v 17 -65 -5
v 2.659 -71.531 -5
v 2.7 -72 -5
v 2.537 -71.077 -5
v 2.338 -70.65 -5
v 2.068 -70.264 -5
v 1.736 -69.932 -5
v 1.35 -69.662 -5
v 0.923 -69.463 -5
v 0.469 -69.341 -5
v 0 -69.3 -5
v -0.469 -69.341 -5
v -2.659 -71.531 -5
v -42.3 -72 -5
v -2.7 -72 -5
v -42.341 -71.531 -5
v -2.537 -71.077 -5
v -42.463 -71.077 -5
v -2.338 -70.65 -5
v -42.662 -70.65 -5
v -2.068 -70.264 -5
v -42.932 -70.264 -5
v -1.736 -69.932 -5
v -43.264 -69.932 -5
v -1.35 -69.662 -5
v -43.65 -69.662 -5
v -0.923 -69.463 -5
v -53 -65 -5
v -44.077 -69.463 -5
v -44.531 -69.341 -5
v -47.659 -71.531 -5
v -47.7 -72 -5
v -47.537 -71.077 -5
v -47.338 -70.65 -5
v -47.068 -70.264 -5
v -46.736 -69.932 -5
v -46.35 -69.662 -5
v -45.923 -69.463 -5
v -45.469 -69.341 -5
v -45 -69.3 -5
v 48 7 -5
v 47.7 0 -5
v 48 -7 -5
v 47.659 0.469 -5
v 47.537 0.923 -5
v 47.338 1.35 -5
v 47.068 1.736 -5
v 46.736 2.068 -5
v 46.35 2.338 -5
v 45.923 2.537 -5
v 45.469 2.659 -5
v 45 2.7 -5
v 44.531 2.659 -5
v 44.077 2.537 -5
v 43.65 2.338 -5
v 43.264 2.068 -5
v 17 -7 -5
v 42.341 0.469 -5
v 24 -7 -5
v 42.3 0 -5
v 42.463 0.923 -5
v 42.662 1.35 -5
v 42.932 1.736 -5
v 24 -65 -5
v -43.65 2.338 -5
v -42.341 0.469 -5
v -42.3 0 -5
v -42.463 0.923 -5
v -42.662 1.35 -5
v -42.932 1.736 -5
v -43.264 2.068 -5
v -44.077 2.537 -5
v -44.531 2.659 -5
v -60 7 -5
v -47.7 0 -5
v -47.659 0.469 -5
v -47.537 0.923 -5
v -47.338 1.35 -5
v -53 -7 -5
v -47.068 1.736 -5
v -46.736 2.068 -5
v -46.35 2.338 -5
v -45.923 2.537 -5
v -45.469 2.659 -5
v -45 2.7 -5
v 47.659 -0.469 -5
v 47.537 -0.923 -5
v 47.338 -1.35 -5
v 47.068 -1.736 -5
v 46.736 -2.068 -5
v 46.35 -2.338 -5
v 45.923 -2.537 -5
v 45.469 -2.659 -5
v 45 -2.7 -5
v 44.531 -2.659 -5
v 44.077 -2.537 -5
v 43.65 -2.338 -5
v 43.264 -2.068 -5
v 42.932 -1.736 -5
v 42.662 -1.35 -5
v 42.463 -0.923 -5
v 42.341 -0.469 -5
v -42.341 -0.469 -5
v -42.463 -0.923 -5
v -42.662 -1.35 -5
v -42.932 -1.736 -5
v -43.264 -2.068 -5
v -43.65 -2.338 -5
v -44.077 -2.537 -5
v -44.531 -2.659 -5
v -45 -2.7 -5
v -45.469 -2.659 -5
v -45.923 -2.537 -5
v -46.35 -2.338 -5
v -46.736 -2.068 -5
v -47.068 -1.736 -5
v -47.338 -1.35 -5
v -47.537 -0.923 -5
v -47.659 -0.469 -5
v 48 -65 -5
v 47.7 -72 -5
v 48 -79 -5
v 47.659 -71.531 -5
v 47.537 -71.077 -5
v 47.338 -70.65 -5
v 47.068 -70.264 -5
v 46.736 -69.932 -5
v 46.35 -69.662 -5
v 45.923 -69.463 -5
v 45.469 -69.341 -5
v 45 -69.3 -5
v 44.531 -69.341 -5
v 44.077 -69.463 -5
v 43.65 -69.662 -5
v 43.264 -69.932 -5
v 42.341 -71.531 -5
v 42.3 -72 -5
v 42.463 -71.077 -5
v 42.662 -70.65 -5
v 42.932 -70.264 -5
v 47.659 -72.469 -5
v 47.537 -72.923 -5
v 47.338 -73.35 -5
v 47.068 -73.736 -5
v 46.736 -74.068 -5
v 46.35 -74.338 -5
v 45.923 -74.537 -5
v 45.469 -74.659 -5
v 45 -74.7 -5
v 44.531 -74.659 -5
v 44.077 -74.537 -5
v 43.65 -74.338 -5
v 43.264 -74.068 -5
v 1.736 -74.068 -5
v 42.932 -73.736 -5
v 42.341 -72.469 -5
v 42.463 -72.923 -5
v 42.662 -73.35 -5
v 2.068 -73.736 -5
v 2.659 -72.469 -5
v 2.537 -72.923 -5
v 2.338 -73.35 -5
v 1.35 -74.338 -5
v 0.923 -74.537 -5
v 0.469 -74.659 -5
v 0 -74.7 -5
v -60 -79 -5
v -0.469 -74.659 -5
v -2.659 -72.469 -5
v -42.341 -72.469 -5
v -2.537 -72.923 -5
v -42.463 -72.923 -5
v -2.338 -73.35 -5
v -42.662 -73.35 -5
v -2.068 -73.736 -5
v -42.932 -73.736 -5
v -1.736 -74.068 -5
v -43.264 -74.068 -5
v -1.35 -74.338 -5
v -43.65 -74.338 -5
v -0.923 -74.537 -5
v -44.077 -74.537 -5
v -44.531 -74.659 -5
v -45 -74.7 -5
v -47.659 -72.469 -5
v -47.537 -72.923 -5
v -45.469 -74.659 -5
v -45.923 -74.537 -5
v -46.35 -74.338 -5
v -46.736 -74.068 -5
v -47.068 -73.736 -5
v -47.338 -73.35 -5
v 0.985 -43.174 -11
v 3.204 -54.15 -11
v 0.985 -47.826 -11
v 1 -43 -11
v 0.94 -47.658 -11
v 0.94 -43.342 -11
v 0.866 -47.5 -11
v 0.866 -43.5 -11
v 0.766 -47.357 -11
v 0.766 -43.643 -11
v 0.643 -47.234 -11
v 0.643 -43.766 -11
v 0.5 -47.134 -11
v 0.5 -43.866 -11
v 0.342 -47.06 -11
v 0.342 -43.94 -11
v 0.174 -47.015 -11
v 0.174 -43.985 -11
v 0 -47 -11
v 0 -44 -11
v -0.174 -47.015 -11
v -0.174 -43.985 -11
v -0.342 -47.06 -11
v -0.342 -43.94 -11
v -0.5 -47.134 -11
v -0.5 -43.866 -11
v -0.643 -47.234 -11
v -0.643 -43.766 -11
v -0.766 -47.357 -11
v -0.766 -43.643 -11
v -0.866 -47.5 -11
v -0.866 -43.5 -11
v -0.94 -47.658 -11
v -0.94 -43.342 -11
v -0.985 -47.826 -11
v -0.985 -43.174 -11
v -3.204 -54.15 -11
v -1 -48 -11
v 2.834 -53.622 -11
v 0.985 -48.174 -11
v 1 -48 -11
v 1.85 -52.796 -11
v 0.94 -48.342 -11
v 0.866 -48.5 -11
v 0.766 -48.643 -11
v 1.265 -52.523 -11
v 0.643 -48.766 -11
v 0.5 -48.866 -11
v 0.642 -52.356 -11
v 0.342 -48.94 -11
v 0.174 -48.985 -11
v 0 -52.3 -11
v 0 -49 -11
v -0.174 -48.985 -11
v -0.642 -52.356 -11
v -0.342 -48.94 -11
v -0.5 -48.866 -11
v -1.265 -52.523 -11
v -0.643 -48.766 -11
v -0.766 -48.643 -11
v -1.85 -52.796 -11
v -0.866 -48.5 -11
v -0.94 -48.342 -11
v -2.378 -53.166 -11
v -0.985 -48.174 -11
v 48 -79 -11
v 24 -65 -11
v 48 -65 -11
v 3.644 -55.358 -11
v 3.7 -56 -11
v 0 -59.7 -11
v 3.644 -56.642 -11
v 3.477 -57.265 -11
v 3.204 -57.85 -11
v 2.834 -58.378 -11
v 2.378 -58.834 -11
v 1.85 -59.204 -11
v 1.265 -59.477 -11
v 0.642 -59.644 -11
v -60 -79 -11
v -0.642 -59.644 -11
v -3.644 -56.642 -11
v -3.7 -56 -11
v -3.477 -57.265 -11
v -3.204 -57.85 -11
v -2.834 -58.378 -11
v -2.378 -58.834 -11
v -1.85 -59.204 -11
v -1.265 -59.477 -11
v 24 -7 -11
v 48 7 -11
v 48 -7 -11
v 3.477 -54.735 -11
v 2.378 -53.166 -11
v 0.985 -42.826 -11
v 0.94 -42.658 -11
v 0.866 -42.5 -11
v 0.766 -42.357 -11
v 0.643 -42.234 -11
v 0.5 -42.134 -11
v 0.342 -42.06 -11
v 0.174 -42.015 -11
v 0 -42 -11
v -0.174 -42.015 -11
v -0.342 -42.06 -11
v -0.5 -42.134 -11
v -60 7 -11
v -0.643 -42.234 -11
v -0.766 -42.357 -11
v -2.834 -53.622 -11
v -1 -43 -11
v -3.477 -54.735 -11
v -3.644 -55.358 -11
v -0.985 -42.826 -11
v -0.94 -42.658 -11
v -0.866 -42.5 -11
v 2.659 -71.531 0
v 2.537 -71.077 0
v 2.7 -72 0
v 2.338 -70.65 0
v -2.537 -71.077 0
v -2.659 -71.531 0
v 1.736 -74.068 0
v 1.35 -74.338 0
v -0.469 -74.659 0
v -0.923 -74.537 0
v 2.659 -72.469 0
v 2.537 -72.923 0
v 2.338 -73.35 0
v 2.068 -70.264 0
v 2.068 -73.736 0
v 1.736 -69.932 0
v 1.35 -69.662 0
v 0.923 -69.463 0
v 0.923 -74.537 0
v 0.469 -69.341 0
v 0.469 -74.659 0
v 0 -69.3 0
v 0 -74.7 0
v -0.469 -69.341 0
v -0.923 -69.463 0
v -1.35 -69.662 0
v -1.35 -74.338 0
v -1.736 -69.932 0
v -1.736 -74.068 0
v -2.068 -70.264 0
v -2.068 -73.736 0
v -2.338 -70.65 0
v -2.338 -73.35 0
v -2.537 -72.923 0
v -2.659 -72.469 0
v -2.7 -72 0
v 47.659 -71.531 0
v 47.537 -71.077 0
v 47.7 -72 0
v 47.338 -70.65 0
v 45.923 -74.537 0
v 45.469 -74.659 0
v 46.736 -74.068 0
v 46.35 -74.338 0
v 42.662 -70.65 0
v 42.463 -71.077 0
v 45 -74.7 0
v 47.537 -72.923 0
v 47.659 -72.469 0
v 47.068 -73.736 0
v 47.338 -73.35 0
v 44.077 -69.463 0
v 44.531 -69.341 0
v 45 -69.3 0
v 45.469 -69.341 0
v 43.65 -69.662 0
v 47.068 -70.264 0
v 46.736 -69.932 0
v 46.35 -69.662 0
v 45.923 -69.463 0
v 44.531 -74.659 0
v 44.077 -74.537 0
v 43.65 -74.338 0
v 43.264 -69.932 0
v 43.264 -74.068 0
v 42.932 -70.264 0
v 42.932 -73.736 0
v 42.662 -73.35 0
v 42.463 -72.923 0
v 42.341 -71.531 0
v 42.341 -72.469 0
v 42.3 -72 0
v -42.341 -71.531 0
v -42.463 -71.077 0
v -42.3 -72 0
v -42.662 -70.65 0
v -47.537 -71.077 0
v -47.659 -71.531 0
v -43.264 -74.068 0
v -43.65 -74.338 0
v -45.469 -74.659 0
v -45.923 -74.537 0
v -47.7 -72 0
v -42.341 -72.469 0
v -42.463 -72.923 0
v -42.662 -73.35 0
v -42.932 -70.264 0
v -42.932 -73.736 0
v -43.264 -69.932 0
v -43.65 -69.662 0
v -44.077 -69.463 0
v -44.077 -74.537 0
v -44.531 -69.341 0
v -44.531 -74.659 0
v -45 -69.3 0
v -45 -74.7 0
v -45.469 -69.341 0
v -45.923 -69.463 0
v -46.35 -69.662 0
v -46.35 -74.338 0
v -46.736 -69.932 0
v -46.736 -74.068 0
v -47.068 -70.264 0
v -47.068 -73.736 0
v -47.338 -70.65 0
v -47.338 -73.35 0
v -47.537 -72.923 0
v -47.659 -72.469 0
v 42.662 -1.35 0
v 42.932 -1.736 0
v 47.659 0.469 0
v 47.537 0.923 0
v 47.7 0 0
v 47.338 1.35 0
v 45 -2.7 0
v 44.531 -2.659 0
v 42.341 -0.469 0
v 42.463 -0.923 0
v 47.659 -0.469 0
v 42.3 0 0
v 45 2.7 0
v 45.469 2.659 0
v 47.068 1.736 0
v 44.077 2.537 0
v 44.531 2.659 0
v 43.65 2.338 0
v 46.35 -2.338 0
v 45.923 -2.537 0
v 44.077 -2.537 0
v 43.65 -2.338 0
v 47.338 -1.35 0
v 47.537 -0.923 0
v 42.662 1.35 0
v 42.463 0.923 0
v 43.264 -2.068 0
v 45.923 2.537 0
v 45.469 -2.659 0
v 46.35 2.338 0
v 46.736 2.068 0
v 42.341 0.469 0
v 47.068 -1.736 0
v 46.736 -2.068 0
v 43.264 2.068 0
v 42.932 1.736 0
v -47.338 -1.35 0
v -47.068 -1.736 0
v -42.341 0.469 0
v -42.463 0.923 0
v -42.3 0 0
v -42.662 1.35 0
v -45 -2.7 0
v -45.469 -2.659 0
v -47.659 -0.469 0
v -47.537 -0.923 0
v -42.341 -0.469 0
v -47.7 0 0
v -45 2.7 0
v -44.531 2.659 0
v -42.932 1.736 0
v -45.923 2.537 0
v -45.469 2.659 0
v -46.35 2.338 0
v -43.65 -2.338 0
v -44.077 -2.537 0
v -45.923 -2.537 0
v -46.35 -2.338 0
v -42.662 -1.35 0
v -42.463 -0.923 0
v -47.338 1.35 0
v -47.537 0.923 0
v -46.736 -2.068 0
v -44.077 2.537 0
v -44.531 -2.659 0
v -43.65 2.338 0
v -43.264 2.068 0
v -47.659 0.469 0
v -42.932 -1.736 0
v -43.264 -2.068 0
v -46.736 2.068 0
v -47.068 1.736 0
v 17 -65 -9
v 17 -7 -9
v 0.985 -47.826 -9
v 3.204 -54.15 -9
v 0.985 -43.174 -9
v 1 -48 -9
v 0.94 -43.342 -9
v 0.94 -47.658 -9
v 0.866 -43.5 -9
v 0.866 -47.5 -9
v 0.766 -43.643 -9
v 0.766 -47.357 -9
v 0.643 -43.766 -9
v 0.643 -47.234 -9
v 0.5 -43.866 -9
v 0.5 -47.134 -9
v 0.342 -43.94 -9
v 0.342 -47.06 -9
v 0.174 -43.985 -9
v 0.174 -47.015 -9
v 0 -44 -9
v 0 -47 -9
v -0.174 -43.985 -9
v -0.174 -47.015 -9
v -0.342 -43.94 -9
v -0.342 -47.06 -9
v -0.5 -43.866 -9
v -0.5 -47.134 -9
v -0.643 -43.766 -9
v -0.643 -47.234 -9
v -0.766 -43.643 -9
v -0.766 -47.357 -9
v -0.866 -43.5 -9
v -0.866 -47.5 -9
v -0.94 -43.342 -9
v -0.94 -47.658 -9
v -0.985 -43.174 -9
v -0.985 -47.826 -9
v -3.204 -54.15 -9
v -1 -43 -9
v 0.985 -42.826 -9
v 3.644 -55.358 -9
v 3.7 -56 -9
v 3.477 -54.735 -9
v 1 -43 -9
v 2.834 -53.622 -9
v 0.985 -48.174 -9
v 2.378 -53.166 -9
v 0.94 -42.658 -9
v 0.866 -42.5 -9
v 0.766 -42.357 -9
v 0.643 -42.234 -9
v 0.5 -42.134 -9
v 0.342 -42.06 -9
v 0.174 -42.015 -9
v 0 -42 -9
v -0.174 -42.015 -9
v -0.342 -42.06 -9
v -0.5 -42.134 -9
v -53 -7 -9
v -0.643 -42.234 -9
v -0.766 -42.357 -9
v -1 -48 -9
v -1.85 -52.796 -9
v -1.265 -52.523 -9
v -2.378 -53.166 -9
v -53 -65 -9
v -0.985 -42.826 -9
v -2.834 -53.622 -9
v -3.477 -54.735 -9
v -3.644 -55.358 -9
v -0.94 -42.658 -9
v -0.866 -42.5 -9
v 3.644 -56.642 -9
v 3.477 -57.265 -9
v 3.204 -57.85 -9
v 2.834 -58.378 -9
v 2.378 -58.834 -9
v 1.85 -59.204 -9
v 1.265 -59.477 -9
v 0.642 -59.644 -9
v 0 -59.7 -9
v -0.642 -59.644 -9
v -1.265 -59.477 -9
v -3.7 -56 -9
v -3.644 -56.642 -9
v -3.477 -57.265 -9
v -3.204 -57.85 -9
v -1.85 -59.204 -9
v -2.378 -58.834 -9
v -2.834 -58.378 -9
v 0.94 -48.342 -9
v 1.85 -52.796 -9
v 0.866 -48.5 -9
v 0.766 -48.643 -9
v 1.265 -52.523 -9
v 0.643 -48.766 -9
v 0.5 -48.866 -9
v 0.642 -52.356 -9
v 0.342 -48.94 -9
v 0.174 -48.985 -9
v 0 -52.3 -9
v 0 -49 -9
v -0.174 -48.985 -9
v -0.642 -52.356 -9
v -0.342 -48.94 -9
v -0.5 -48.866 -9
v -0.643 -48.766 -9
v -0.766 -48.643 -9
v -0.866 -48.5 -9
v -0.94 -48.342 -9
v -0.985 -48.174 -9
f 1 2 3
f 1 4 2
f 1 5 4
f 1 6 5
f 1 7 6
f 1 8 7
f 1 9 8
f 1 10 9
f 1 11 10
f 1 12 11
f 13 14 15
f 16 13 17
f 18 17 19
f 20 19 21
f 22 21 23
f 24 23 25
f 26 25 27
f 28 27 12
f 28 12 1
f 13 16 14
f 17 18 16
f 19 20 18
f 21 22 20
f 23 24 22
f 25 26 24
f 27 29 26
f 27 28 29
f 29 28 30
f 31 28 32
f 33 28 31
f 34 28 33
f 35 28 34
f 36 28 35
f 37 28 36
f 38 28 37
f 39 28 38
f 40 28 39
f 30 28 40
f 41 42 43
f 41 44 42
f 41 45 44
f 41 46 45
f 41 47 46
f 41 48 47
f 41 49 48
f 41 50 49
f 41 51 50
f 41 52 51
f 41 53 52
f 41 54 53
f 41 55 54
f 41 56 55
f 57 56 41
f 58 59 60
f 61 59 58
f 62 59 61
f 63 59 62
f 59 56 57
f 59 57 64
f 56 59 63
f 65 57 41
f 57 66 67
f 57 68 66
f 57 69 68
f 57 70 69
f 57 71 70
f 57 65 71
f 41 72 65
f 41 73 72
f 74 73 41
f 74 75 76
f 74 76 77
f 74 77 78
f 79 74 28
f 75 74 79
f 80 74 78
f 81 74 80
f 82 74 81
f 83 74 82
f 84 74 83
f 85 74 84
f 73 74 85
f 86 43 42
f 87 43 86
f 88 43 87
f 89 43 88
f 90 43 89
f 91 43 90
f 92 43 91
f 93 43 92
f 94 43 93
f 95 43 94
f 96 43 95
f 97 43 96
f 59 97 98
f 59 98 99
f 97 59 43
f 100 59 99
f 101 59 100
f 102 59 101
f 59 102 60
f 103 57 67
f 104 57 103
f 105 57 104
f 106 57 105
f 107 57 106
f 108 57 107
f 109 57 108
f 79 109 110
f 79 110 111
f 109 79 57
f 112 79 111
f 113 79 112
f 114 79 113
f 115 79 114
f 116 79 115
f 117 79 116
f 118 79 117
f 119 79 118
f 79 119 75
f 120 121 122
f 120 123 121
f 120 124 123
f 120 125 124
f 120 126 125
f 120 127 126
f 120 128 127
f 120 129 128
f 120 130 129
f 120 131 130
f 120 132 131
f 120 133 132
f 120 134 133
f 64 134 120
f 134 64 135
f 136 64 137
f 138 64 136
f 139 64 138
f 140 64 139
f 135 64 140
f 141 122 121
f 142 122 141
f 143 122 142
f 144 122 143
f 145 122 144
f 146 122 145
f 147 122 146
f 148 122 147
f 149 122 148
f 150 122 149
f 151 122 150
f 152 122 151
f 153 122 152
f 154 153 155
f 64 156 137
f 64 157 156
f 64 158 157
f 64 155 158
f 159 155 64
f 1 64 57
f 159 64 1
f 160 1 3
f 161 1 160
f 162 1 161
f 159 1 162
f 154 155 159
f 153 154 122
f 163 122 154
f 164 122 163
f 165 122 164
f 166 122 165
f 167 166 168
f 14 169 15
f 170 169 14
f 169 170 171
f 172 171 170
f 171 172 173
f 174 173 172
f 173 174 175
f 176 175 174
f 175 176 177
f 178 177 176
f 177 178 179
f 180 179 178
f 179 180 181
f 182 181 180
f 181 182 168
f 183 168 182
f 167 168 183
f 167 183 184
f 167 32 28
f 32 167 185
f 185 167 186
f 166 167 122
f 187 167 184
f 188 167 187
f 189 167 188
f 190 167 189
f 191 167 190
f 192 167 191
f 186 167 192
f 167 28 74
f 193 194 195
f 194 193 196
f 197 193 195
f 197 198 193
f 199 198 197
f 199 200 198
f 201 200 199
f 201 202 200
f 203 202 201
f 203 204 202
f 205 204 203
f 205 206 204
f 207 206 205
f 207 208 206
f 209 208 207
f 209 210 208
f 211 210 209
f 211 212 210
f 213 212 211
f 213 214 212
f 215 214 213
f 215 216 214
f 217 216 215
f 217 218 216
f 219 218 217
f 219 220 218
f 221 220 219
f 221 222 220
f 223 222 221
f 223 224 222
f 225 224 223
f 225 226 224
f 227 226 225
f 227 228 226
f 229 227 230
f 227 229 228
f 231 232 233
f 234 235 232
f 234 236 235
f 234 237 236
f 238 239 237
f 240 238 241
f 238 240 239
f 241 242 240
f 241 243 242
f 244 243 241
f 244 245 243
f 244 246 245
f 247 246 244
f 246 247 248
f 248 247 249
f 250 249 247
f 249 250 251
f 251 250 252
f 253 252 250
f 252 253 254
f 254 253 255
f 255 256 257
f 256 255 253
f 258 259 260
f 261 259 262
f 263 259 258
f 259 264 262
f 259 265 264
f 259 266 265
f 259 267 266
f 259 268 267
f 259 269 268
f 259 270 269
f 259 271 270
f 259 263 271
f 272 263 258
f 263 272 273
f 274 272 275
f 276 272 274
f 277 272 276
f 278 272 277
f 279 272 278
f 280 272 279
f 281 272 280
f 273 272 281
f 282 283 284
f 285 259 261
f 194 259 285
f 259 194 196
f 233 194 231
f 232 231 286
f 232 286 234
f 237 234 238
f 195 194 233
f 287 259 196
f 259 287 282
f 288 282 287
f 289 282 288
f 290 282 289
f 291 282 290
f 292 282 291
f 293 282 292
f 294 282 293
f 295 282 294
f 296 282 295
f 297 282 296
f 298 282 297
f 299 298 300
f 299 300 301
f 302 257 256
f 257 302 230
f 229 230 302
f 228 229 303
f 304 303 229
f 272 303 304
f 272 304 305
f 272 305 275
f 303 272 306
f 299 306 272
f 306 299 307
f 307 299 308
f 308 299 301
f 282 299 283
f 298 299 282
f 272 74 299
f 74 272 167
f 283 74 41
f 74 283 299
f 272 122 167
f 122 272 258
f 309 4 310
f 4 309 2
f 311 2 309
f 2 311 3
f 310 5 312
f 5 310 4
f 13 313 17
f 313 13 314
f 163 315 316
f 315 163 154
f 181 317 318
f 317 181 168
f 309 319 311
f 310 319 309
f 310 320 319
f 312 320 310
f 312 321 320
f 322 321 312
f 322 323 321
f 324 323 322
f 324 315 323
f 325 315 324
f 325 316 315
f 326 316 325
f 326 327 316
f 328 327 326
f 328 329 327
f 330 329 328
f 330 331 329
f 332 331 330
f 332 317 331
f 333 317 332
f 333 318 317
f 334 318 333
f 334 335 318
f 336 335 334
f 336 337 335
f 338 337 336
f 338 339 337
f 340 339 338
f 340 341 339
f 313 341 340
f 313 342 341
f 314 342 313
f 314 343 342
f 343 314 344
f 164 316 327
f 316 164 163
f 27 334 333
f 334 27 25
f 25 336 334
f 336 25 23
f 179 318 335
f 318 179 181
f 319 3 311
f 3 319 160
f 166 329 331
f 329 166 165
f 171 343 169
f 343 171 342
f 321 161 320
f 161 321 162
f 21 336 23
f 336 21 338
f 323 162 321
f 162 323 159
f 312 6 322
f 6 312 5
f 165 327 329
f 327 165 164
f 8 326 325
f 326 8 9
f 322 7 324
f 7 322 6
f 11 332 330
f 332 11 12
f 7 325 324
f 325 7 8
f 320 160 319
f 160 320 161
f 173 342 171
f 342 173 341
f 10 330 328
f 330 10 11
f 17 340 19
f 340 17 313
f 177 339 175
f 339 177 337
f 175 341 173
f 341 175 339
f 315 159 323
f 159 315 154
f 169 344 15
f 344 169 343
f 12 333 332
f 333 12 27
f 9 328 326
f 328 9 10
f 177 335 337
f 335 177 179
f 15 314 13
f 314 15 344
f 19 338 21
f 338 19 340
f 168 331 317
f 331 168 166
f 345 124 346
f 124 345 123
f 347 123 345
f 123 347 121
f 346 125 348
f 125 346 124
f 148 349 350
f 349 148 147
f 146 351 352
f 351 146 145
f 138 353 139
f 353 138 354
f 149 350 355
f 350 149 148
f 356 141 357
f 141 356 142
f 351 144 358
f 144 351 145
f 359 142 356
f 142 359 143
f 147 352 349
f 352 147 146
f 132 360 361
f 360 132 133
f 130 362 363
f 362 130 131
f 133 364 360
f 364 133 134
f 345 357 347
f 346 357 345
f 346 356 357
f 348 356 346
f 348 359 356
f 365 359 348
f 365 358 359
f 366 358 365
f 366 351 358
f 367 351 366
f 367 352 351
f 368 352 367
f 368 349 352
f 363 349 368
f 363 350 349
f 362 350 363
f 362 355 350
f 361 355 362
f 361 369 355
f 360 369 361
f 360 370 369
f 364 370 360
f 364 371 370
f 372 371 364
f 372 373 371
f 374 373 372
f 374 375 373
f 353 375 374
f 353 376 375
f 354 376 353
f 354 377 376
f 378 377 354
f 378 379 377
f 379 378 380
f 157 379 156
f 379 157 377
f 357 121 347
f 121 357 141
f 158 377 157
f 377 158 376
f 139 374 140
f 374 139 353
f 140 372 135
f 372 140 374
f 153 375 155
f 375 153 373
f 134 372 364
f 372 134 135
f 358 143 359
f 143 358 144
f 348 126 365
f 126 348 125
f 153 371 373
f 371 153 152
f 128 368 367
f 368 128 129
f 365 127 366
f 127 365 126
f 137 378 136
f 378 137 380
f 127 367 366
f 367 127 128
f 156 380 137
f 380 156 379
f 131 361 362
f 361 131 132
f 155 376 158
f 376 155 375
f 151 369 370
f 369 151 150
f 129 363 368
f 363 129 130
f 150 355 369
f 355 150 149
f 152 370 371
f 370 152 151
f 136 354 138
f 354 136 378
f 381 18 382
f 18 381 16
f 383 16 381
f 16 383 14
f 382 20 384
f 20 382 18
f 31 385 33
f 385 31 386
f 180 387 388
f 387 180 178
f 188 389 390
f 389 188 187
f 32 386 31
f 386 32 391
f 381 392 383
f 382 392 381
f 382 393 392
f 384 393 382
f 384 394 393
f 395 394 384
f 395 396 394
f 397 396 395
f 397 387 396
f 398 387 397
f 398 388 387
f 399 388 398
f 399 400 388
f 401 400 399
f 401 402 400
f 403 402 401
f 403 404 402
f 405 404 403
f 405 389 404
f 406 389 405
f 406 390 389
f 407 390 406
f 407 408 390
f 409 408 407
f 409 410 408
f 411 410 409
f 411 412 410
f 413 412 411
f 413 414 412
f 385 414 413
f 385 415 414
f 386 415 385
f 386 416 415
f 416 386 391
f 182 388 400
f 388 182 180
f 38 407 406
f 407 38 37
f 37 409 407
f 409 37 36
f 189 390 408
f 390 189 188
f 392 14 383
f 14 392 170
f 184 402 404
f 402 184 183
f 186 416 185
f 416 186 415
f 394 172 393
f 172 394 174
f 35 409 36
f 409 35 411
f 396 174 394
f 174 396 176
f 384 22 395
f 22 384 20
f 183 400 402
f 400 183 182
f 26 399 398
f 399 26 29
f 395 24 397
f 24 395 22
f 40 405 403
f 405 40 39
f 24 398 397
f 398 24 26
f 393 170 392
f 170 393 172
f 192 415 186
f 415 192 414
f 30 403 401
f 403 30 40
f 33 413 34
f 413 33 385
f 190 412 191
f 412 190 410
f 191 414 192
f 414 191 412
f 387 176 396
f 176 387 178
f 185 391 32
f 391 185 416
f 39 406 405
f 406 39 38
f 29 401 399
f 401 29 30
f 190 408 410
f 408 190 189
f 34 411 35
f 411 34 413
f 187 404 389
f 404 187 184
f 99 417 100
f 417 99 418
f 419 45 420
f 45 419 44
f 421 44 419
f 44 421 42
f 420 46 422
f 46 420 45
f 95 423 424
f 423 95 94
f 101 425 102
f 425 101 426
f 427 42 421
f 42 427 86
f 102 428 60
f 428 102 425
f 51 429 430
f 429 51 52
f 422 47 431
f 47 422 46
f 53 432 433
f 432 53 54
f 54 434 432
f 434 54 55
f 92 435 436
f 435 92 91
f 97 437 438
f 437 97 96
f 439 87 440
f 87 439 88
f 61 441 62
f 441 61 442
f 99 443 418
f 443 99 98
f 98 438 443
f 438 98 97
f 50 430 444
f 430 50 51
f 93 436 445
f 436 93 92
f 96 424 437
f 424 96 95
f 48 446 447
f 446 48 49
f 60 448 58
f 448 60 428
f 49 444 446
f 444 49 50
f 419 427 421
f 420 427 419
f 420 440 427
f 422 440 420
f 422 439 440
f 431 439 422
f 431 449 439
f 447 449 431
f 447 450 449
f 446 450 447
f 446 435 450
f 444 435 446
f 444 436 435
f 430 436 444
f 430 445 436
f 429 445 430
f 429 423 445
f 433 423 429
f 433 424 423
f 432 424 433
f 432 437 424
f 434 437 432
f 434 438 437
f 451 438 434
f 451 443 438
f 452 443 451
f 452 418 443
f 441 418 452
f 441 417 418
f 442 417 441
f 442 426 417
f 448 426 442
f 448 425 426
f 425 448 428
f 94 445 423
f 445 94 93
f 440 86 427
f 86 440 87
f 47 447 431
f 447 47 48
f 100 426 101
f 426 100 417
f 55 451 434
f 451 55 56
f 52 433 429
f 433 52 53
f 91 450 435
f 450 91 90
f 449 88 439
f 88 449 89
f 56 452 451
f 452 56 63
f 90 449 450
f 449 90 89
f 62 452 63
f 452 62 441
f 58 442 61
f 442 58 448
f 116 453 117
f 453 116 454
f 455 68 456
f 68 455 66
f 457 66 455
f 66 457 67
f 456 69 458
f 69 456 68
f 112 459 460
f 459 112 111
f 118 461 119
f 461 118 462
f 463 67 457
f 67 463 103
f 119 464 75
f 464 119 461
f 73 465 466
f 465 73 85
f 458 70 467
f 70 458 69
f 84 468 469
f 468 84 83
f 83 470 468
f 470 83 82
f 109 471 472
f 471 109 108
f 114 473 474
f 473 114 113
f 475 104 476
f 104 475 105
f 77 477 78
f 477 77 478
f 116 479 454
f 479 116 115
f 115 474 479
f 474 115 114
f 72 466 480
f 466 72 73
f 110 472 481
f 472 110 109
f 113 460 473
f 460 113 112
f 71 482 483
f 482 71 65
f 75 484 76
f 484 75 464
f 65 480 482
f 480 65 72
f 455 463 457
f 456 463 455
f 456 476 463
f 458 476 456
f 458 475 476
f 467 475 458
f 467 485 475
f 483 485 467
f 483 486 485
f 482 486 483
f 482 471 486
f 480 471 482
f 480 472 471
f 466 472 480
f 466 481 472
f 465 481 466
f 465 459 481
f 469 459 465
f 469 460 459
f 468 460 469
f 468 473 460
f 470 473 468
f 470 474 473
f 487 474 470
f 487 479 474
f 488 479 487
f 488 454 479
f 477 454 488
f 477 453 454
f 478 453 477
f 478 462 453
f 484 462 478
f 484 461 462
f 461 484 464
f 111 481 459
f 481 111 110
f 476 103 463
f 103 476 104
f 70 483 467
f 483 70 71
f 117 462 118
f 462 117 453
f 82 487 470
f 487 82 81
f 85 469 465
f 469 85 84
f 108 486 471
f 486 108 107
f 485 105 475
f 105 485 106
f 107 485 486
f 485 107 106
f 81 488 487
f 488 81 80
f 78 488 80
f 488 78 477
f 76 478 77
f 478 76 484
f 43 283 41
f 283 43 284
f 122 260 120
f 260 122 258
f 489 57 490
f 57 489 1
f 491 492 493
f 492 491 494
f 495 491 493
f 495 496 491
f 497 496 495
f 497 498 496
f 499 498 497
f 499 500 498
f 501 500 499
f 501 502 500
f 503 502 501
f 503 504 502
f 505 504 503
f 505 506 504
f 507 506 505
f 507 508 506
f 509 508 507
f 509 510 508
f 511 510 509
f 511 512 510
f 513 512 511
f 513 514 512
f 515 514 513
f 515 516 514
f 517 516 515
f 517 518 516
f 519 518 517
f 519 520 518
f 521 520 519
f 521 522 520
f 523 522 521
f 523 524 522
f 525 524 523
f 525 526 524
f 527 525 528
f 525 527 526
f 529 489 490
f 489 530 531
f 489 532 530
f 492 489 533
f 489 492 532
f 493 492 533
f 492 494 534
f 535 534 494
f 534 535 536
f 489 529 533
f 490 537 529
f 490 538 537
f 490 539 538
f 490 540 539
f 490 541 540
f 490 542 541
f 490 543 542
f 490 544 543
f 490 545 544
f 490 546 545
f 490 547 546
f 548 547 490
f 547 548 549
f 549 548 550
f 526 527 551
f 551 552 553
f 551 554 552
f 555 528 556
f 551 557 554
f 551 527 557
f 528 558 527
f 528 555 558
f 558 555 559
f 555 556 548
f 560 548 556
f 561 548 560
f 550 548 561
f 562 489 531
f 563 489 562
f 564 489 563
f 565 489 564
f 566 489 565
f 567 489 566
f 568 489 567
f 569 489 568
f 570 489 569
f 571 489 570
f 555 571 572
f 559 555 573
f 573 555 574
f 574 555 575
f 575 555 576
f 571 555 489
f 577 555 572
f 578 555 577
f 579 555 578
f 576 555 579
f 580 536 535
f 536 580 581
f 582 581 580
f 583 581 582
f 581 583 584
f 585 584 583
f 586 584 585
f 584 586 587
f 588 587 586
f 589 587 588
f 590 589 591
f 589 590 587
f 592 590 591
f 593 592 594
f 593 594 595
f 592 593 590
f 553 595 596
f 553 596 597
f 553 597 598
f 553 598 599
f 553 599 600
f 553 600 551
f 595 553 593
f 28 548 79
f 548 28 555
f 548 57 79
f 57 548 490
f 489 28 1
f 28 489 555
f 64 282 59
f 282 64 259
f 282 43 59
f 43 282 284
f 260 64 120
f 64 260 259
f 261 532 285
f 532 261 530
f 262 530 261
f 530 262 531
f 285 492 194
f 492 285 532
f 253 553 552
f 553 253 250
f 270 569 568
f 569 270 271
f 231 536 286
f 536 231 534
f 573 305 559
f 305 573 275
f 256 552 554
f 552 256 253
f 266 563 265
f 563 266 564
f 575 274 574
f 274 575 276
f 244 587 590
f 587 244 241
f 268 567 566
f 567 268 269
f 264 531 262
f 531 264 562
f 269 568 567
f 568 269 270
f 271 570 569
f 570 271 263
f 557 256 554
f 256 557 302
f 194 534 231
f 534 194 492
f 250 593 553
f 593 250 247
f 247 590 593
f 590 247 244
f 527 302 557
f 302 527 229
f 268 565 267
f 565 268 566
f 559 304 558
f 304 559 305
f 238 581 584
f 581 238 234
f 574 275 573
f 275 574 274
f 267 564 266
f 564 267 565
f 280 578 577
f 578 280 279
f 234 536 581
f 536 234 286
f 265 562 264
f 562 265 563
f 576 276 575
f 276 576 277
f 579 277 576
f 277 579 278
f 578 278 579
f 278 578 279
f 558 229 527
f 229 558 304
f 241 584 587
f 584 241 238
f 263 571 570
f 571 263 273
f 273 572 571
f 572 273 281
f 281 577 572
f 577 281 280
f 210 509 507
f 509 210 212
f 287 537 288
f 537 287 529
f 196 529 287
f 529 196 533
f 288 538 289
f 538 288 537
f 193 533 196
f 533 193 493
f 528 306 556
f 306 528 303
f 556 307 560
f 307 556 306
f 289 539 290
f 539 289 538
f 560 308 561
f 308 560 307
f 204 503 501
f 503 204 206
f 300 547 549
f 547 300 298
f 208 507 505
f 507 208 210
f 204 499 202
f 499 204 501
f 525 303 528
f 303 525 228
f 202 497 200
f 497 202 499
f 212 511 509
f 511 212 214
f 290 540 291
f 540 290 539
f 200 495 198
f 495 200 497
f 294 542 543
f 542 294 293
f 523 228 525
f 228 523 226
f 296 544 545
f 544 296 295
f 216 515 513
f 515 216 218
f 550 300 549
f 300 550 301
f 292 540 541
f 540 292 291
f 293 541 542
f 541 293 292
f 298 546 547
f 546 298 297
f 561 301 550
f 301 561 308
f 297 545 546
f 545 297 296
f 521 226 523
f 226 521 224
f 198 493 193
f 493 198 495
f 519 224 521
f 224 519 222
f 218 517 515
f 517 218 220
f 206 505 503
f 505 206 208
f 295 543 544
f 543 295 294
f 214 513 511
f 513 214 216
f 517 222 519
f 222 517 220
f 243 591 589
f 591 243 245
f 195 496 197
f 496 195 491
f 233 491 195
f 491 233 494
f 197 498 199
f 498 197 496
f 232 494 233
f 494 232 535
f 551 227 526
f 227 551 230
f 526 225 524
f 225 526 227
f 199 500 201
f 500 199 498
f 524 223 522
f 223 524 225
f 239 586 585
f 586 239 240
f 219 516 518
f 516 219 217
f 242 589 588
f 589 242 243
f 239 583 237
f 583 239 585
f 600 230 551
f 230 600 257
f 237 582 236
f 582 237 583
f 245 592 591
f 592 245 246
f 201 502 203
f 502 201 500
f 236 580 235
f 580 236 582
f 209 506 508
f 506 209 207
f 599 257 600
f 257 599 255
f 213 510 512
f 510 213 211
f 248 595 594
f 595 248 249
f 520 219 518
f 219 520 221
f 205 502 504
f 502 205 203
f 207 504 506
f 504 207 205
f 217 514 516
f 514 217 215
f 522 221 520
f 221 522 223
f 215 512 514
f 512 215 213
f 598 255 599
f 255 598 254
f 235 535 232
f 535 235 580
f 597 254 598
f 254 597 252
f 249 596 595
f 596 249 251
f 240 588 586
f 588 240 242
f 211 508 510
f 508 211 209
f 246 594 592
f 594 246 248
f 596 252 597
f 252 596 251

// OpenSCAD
//ReaderLid.scad (c) by Embecosm Ltd.
//
//ReaderLid.scad is licensed under a
//Creative Commons Attribution-ShareAlike 4.0 International License.
//
//You should have received a copy of the license along with this
//work. If not, see <http://creativecommons.org/licenses/by-sa/4.0/>.
 translate([0,-36,-8])

difference(){
    union(){
        cube([120,86,6], center=true);
        translate([0,-36,3])
            cylinder(r=2.7, h=10, center=true, $fn=36);
        translate([45,-36,3])
            cylinder(r=2.7, h=10, center=true, $fn=36);
        translate([-45,-36,3])
            cylinder(r=2.7, h=10, center=true, $fn=36);
        translate([45,36,3])
            cylinder(r=2.7, h=10, center=true, $fn=36);
        translate([-45,36,3])
            cylinder(r=2.7, h=10, center=true, $fn=36);
    };
    translate([148,0,0])
        cube([200,100,10], center=true);
    translate([-18,0,2])
        cube([70,58,6], center=true);
    translate([59,0,2])
        cube([70,58,10], center=true);
    translate([0,-20,0])
        cylinder(r=3.7, h=10, center=true, $fn=36);
    translate([0,-7,0])
        cylinder(r=1.0, h=10, center=true, $fn=36);
    translate([0,-12,0])
        cylinder(r=1.0, h=10, center=true, $fn=36);
};
